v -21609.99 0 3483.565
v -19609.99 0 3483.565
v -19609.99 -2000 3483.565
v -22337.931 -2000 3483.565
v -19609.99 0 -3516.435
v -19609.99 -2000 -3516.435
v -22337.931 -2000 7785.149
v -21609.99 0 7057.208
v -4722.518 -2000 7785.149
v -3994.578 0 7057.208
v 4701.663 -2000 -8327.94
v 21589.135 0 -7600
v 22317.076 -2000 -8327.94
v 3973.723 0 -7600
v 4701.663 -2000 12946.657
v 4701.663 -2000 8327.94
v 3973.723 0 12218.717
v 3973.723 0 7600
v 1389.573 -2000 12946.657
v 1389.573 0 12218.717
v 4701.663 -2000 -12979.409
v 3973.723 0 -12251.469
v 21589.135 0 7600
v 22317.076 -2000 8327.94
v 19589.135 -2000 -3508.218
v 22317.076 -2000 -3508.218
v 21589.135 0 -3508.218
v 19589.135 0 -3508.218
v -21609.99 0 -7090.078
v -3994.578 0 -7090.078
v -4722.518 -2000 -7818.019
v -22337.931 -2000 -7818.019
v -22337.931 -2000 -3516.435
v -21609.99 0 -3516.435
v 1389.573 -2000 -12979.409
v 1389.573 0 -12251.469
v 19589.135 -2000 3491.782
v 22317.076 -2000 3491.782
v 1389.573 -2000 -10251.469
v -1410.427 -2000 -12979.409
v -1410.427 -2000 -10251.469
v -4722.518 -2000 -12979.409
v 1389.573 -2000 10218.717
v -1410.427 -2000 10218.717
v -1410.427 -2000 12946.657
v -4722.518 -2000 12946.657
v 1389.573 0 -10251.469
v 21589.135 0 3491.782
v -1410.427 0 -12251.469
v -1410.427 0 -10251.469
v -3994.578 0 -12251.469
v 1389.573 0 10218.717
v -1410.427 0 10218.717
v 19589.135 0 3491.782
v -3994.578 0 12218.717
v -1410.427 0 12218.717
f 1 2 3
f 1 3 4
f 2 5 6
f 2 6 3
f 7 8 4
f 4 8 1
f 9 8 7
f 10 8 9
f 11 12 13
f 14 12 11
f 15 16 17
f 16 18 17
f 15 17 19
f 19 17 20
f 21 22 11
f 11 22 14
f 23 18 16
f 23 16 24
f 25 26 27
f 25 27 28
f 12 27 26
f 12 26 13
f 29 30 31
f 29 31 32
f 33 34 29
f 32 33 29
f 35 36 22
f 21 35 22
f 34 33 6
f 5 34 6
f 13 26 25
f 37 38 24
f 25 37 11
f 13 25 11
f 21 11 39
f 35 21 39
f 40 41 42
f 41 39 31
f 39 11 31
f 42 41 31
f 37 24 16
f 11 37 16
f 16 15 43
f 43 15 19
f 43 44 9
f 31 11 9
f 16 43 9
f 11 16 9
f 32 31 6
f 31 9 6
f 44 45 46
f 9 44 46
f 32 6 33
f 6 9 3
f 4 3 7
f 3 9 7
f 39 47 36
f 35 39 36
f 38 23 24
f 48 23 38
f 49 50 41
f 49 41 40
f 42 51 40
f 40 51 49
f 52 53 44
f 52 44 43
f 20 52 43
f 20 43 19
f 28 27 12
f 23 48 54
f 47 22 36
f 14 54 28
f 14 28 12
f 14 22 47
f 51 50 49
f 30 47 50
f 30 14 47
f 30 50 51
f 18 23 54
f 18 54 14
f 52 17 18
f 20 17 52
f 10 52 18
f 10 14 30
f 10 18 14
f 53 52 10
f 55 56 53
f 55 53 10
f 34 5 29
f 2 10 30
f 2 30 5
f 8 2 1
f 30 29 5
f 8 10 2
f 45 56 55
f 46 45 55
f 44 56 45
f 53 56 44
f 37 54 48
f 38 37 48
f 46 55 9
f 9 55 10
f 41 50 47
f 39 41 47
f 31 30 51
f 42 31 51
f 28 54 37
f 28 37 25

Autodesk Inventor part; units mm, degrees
ref_plane "YZ Plane" through (0, 0, 0) normal (1, 0, 0) x (0, 1, 0)
ref_plane "XZ Plane" through (0, 0, 0) normal (0, 1, 0) x (-1, 0, 0)
ref_plane "XY Plane" through (0, 0, 0) normal (0, 0, 1) x (1, 0, 0)
sketch "Sketch1" plane through (0, 0, 0) normal (0, 1, 0) x (-1, 0, 0)
  line L0 (-18589.1353, 7057.2083) -> (-18589.1353, -7090.0785)
  line L1 (18609.9901, -7090.0785) -> (18609.9901, 7057.2083)
  line L2 (18609.9901, 7057.2083) -> (21609.9901, 7057.2083)
  line L3 (21609.9901, 7057.2083) -> (21609.9901, -7090.0785)
  line L4 (21609.9901, -7090.0785) -> (18609.9901, -7090.0785)
  line L5 (18609.9901, -7090.0785) -> (18609.9901, 7057.2083)
  line L6 (-18589.1353, 7057.2083) -> (-21589.1353, 7057.2083)
  line L7 (-21589.1353, 7057.2083) -> (-21589.1353, -7090.0785)
  line L8 (-21589.1353, -7090.0785) -> (-18589.1353, -7090.0785)
  line L9 (-18589.1353, -7090.0785) -> (-18589.1353, 7057.2083)
  line L10 (18609.9901, 7057.2083) -> (3994.5778, 7057.2083)
  line L11 (-3973.723, 7057.2083) -> (-18589.1353, 7057.2083)
  line L12 (-18589.1353, -7090.0785) -> (-3973.723, -7090.0785)
  line L13 (3994.5778, -7090.0785) -> (18609.9901, -7090.0785)
  line L14 (3994.5778, -11251.4689) -> (3994.5778, -12251.4689)
  line L15 (3994.5778, -12251.4689) -> (1994.5778, -12251.4689)
  line L16 (-3973.723, 11218.7168) -> (-3973.723, 12218.7168)
  line L17 (-3973.723, 12218.7168) -> (-1973.723, 12218.7168)
  line L18 (3994.5778, -12251.4689) -> (-3973.723, -12251.4689)
  line L19 (-3973.723, -12251.4689) -> (-3973.723, 12218.7168)
  line L20 (-3973.723, 12218.7168) -> (3994.5778, 12218.7168)
  line L21 (3994.5778, 12218.7168) -> (3994.5778, -12251.4689)
  line L22 (21589.1353, 7600) -> (-21589.1353, 7600)
  line L23 (-21589.1353, 7600) -> (-21589.1353, -7600)
  line L24 (-21589.1353, -7600) -> (21589.1353, -7600)
  line L25 (21589.1353, 7600) -> (-21589.1353, -7600) construction
  line L26 (-21589.1353, 7600) -> (21589.1353, -7600) construction
  line L27 (10.4274, -12251.4689) -> (1410.4274, -12251.4689)
  line L28 (1410.4274, -12251.4689) -> (1410.4274, -10251.4689)
  line L29 (1410.4274, -10251.4689) -> (-1389.5726, -10251.4689)
  line L30 (-1389.5726, -10251.4689) -> (-1389.5726, -12251.4689)
  line L31 (10.4274, 12218.7168) -> (1410.4274, 12218.7168)
  line L32 (1410.4274, 12218.7168) -> (1410.4274, 10218.7168)
  line L33 (1410.4274, 10218.7168) -> (-1389.5726, 10218.7168)
  line L34 (-1389.5726, 10218.7168) -> (-1389.5726, 12218.7168)
  line L35 (-21589.1353, 0) -> (-19589.1353, 0)
  line L36 (-19589.1353, 0) -> (-21589.1353, 0)
  line L37 (-21589.1353, 0) -> (-21589.1353, 3500)
  line L38 (21589.1353, 7057.2083) -> (21589.1353, 7600)
  line L39 (21609.9901, -7090.0785) -> (21609.9901, -7600)
  line L40 (21589.1353, -7600) -> (21609.9901, -7600)
  line L41 (21609.9901, -16.4351) -> (21609.9901, -3516.4351)
  line L42 (21609.9901, -3516.4351) -> (19609.9901, -3516.4351)
  line L43 (19609.9901, -3516.4351) -> (19609.9901, 3483.5649)
  line L44 (19609.9901, 3483.5649) -> (21609.9901, 3483.5649)
  line L45 (21609.9901, 3483.5649) -> (21609.9901, -3516.4351)
  line L46 (-21589.1353, 3500) -> (-19589.1353, 3500)
  line L47 (-19589.1353, 3500) -> (-19589.1353, -3500)
  line L48 (-19589.1353, -3500) -> (-21589.1353, -3500)
  line L49 (-21589.1353, -3500) -> (-21589.1353, 3500)
  point P0 (1994.5778, 9218.7168)
  point P1 (1994.5778, -9251.4689)
  point P2 (-1973.723, -9251.4689)
  point P3 (-1973.723, -11251.4689)
  point P4 (0, 0)
  point P5 (3994.5778, -7600)
  point P6 (-3973.723, -7600)
  point P7 (-3973.723, 7600)
  point P8 (3994.5778, 7600)
  point P9 (21589.1353, -7090.0785)
  dimension "d0" = 3000
  dimension "d1" = 3000
  dimension "d12" = 15200
  dimension "d13" = 1400
  dimension "d14" = 2000
  dimension "d15" = 2800
  dimension "d16" = 1400
  dimension "d17" = 2000
  dimension "d18" = 2800
  dimension "d19" = 2000
  dimension "d21" = 3500
  dimension "d22" = 3500
  dimension "d23" = 2000
  dimension "d24" = 7000
  dimension "d27" = 2000
  dimension "d28" = 7000
extrude "Extrusion2" add sketch "Sketch1" against normal blind 2000 draft 20 contours L11 L19 L12 L0 | L0 L8 L7 L48 L47 L46 L6 | L6 L23 L22 L19 L11 | L12 L19 L24 L23 L8 | L19 L22 L21 L24 | L46 L47 L35 L7 | L19 L16 L17 L20 L34 L33 L32 L21 L22 | L7 L35 L47 L48 | L24 L21 L14 L15 L18 L28 L29 L30 L19 | L10 L1 L13 L21 | L30 L29 L28 L18 | L32 L33 L34 L20 | L2 L3 L44 L43 L42 L4 L1 | L3 L42 L43 L44
sketch "Sketch2" plane through (0, 0, 0) normal (0, 1, 0) x (1, 0, 0)
  line L0 (-1410.4274, -10218.7168) -> (1389.5726, -10218.7168) projected
  line L1 (-1410.4274, -10218.7168) -> (1389.5726, -10218.7168)
  line L2 (1389.5726, -10218.7168) -> (1389.5726, -19039.5456)
  line L3 (1389.5726, -19039.5456) -> (-1410.4274, -19039.5456)
  line L4 (-1410.4274, -19039.5456) -> (-1410.4274, -10218.7168)
  line L5 (-1410.4274, 10251.4689) -> (-1410.4274, 12251.4689) projected
  line L6 (-1410.4274, 10251.4689) -> (1389.5726, 10251.4689)
  line L7 (1389.5726, 10251.4689) -> (1389.5726, 17503.4785)
  line L8 (1389.5726, 17503.4785) -> (-1410.4274, 17503.4785)
  line L9 (-1410.4274, 17503.4785) -> (-1410.4274, 10251.4689)
  line L10 (-19609.9901, 3516.4351) -> (-19609.9901, -3483.5649) projected
  line L11 (-19609.9901, -3483.5649) -> (-29137.8877, -3483.5649)
  line L12 (-29137.8877, -3483.5649) -> (-29137.8877, 3516.4351)
  line L13 (-29137.8877, 3516.4351) -> (-19609.9901, 3516.4351)
  line L14 (-19609.9901, 3516.4351) -> (-19609.9901, -3483.5649)
  line L15 (19589.1353, 8.2175) -> (19589.1353, -3491.7825)
  line L16 (19589.1353, 8.2175) -> (19589.1353, 3508.2175)
  line L17 (19589.1353, -3491.7825) -> (31199.6373, -3491.7825)
  line L18 (31199.6373, -3491.7825) -> (31199.6373, 3508.2175)
  line L19 (31199.6373, 3508.2175) -> (19589.1353, 3508.2175)
  point P0 (0, 0)
  point P1 (19589.1353, -3500)
  dimension "d29" = 3500
  dimension "d30" = 3500
extrude "Extrusion3" cut sketch "Sketch2" against normal blind 2000
sketch "Sketch3" plane through (0, 0, 0) normal (0, 1, 0) x (1, 0, 0)
  line L0 (1389.5726, -10218.7168) -> (-1410.4274, -10218.7168) projected
  line L1 (1389.5726, -12946.6572) -> (4701.6634, -12946.6572) projected
  line L2 (-1410.4274, -10218.7168) -> (1389.5726, -10218.7168)
  line L3 (1389.5726, -10218.7168) -> (1389.5726, -12946.6572)
  line L4 (1389.5726, -12946.6572) -> (-1410.4274, -12946.6572)
  line L5 (-1410.4274, -12946.6572) -> (-1410.4274, -10218.7168)
  point P0 (0, 0)
properties part number "main_floor" material "Limestone"
